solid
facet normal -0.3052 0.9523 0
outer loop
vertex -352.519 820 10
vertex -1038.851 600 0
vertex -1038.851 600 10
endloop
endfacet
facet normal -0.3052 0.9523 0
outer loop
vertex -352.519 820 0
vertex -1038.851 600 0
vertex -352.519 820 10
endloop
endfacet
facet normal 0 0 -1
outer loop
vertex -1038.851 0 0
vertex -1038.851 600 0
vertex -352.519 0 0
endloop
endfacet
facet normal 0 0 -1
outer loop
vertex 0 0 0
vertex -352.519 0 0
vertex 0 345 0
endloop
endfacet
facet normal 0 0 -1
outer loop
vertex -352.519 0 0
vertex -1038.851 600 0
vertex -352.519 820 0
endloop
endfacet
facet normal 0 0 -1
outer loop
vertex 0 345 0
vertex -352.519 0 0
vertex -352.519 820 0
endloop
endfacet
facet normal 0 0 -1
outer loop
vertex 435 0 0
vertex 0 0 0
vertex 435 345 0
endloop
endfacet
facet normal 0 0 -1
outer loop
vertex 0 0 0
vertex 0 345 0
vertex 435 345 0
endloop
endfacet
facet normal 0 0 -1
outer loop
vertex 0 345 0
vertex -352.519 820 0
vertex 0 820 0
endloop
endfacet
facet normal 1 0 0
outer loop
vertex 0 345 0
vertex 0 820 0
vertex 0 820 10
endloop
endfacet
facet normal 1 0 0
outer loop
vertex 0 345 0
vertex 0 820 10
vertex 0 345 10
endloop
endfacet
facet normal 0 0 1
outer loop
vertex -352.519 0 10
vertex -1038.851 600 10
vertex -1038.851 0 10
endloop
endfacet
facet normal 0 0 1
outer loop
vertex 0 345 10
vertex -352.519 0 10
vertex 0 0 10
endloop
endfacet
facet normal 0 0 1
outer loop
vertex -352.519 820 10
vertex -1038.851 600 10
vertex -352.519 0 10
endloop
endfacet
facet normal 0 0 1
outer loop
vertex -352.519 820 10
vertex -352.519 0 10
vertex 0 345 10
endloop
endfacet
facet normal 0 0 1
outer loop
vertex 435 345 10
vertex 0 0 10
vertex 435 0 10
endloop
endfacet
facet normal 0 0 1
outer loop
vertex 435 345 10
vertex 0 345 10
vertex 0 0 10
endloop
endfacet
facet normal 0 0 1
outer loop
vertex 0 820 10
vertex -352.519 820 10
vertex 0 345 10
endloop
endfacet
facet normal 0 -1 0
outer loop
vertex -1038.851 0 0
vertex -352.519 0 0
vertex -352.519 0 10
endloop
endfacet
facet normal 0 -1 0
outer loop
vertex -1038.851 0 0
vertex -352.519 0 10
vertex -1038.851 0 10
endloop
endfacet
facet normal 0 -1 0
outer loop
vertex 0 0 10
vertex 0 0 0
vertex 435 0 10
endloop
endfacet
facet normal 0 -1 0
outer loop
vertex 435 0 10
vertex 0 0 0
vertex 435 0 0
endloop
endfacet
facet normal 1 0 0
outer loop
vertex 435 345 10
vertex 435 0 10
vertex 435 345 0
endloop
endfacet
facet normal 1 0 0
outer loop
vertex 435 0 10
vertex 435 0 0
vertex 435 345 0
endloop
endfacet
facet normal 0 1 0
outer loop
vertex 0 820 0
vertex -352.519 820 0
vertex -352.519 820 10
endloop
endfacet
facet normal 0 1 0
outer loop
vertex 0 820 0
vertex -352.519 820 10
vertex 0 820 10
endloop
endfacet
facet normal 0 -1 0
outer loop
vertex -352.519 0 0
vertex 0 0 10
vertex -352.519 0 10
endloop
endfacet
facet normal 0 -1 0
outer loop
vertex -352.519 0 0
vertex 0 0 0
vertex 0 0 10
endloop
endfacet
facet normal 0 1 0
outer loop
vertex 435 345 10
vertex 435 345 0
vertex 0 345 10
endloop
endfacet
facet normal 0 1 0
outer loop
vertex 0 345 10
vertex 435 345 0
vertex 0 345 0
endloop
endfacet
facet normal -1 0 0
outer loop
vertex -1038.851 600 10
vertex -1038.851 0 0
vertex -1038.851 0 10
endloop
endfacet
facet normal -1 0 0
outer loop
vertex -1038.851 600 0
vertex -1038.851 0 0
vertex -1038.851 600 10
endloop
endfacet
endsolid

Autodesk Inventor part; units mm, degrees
ref_plane "YZ Plane" through (0, 0, 0) normal (1, 0, 0) x (0, 1, 0)
ref_plane "XZ Plane" through (0, 0, 0) normal (0, 1, 0) x (-1, 0, 0)
ref_plane "XY Plane" through (0, 0, 0) normal (0, 0, 1) x (1, 0, 0)
sketch "스케치4" plane through (0, 0, 0) normal (0, 0, 1) x (1, 0, 0)
  line L0 (0, 0) -> (435, 0)
  line L1 (435, 0) -> (435, 345)
  line L2 (435, 345) -> (0, 345)
  line L3 (0, 0) -> (-1038.851, 0)
  line L4 (-1038.851, 0) -> (-1038.851, 600)
  line L5 (0, 0) -> (-352.5186, 0)
  line L6 (-352.5186, 820) -> (0, 820)
  line L7 (0, 820) -> (0, 345)
  line L8 (-1038.851, 600) -> (-352.5186, 820)
  dimension "d46" = 435
  dimension "d47" = 1473.851
  dimension "d48" = 345
  dimension "d49" = 475
  dimension "d50" = 435
  dimension "d53" = 787.5186
  dimension "d56" = 600
extrude "돌출3" add sketch "스케치4" along normal blind 10
properties part number "사이드 카울"
